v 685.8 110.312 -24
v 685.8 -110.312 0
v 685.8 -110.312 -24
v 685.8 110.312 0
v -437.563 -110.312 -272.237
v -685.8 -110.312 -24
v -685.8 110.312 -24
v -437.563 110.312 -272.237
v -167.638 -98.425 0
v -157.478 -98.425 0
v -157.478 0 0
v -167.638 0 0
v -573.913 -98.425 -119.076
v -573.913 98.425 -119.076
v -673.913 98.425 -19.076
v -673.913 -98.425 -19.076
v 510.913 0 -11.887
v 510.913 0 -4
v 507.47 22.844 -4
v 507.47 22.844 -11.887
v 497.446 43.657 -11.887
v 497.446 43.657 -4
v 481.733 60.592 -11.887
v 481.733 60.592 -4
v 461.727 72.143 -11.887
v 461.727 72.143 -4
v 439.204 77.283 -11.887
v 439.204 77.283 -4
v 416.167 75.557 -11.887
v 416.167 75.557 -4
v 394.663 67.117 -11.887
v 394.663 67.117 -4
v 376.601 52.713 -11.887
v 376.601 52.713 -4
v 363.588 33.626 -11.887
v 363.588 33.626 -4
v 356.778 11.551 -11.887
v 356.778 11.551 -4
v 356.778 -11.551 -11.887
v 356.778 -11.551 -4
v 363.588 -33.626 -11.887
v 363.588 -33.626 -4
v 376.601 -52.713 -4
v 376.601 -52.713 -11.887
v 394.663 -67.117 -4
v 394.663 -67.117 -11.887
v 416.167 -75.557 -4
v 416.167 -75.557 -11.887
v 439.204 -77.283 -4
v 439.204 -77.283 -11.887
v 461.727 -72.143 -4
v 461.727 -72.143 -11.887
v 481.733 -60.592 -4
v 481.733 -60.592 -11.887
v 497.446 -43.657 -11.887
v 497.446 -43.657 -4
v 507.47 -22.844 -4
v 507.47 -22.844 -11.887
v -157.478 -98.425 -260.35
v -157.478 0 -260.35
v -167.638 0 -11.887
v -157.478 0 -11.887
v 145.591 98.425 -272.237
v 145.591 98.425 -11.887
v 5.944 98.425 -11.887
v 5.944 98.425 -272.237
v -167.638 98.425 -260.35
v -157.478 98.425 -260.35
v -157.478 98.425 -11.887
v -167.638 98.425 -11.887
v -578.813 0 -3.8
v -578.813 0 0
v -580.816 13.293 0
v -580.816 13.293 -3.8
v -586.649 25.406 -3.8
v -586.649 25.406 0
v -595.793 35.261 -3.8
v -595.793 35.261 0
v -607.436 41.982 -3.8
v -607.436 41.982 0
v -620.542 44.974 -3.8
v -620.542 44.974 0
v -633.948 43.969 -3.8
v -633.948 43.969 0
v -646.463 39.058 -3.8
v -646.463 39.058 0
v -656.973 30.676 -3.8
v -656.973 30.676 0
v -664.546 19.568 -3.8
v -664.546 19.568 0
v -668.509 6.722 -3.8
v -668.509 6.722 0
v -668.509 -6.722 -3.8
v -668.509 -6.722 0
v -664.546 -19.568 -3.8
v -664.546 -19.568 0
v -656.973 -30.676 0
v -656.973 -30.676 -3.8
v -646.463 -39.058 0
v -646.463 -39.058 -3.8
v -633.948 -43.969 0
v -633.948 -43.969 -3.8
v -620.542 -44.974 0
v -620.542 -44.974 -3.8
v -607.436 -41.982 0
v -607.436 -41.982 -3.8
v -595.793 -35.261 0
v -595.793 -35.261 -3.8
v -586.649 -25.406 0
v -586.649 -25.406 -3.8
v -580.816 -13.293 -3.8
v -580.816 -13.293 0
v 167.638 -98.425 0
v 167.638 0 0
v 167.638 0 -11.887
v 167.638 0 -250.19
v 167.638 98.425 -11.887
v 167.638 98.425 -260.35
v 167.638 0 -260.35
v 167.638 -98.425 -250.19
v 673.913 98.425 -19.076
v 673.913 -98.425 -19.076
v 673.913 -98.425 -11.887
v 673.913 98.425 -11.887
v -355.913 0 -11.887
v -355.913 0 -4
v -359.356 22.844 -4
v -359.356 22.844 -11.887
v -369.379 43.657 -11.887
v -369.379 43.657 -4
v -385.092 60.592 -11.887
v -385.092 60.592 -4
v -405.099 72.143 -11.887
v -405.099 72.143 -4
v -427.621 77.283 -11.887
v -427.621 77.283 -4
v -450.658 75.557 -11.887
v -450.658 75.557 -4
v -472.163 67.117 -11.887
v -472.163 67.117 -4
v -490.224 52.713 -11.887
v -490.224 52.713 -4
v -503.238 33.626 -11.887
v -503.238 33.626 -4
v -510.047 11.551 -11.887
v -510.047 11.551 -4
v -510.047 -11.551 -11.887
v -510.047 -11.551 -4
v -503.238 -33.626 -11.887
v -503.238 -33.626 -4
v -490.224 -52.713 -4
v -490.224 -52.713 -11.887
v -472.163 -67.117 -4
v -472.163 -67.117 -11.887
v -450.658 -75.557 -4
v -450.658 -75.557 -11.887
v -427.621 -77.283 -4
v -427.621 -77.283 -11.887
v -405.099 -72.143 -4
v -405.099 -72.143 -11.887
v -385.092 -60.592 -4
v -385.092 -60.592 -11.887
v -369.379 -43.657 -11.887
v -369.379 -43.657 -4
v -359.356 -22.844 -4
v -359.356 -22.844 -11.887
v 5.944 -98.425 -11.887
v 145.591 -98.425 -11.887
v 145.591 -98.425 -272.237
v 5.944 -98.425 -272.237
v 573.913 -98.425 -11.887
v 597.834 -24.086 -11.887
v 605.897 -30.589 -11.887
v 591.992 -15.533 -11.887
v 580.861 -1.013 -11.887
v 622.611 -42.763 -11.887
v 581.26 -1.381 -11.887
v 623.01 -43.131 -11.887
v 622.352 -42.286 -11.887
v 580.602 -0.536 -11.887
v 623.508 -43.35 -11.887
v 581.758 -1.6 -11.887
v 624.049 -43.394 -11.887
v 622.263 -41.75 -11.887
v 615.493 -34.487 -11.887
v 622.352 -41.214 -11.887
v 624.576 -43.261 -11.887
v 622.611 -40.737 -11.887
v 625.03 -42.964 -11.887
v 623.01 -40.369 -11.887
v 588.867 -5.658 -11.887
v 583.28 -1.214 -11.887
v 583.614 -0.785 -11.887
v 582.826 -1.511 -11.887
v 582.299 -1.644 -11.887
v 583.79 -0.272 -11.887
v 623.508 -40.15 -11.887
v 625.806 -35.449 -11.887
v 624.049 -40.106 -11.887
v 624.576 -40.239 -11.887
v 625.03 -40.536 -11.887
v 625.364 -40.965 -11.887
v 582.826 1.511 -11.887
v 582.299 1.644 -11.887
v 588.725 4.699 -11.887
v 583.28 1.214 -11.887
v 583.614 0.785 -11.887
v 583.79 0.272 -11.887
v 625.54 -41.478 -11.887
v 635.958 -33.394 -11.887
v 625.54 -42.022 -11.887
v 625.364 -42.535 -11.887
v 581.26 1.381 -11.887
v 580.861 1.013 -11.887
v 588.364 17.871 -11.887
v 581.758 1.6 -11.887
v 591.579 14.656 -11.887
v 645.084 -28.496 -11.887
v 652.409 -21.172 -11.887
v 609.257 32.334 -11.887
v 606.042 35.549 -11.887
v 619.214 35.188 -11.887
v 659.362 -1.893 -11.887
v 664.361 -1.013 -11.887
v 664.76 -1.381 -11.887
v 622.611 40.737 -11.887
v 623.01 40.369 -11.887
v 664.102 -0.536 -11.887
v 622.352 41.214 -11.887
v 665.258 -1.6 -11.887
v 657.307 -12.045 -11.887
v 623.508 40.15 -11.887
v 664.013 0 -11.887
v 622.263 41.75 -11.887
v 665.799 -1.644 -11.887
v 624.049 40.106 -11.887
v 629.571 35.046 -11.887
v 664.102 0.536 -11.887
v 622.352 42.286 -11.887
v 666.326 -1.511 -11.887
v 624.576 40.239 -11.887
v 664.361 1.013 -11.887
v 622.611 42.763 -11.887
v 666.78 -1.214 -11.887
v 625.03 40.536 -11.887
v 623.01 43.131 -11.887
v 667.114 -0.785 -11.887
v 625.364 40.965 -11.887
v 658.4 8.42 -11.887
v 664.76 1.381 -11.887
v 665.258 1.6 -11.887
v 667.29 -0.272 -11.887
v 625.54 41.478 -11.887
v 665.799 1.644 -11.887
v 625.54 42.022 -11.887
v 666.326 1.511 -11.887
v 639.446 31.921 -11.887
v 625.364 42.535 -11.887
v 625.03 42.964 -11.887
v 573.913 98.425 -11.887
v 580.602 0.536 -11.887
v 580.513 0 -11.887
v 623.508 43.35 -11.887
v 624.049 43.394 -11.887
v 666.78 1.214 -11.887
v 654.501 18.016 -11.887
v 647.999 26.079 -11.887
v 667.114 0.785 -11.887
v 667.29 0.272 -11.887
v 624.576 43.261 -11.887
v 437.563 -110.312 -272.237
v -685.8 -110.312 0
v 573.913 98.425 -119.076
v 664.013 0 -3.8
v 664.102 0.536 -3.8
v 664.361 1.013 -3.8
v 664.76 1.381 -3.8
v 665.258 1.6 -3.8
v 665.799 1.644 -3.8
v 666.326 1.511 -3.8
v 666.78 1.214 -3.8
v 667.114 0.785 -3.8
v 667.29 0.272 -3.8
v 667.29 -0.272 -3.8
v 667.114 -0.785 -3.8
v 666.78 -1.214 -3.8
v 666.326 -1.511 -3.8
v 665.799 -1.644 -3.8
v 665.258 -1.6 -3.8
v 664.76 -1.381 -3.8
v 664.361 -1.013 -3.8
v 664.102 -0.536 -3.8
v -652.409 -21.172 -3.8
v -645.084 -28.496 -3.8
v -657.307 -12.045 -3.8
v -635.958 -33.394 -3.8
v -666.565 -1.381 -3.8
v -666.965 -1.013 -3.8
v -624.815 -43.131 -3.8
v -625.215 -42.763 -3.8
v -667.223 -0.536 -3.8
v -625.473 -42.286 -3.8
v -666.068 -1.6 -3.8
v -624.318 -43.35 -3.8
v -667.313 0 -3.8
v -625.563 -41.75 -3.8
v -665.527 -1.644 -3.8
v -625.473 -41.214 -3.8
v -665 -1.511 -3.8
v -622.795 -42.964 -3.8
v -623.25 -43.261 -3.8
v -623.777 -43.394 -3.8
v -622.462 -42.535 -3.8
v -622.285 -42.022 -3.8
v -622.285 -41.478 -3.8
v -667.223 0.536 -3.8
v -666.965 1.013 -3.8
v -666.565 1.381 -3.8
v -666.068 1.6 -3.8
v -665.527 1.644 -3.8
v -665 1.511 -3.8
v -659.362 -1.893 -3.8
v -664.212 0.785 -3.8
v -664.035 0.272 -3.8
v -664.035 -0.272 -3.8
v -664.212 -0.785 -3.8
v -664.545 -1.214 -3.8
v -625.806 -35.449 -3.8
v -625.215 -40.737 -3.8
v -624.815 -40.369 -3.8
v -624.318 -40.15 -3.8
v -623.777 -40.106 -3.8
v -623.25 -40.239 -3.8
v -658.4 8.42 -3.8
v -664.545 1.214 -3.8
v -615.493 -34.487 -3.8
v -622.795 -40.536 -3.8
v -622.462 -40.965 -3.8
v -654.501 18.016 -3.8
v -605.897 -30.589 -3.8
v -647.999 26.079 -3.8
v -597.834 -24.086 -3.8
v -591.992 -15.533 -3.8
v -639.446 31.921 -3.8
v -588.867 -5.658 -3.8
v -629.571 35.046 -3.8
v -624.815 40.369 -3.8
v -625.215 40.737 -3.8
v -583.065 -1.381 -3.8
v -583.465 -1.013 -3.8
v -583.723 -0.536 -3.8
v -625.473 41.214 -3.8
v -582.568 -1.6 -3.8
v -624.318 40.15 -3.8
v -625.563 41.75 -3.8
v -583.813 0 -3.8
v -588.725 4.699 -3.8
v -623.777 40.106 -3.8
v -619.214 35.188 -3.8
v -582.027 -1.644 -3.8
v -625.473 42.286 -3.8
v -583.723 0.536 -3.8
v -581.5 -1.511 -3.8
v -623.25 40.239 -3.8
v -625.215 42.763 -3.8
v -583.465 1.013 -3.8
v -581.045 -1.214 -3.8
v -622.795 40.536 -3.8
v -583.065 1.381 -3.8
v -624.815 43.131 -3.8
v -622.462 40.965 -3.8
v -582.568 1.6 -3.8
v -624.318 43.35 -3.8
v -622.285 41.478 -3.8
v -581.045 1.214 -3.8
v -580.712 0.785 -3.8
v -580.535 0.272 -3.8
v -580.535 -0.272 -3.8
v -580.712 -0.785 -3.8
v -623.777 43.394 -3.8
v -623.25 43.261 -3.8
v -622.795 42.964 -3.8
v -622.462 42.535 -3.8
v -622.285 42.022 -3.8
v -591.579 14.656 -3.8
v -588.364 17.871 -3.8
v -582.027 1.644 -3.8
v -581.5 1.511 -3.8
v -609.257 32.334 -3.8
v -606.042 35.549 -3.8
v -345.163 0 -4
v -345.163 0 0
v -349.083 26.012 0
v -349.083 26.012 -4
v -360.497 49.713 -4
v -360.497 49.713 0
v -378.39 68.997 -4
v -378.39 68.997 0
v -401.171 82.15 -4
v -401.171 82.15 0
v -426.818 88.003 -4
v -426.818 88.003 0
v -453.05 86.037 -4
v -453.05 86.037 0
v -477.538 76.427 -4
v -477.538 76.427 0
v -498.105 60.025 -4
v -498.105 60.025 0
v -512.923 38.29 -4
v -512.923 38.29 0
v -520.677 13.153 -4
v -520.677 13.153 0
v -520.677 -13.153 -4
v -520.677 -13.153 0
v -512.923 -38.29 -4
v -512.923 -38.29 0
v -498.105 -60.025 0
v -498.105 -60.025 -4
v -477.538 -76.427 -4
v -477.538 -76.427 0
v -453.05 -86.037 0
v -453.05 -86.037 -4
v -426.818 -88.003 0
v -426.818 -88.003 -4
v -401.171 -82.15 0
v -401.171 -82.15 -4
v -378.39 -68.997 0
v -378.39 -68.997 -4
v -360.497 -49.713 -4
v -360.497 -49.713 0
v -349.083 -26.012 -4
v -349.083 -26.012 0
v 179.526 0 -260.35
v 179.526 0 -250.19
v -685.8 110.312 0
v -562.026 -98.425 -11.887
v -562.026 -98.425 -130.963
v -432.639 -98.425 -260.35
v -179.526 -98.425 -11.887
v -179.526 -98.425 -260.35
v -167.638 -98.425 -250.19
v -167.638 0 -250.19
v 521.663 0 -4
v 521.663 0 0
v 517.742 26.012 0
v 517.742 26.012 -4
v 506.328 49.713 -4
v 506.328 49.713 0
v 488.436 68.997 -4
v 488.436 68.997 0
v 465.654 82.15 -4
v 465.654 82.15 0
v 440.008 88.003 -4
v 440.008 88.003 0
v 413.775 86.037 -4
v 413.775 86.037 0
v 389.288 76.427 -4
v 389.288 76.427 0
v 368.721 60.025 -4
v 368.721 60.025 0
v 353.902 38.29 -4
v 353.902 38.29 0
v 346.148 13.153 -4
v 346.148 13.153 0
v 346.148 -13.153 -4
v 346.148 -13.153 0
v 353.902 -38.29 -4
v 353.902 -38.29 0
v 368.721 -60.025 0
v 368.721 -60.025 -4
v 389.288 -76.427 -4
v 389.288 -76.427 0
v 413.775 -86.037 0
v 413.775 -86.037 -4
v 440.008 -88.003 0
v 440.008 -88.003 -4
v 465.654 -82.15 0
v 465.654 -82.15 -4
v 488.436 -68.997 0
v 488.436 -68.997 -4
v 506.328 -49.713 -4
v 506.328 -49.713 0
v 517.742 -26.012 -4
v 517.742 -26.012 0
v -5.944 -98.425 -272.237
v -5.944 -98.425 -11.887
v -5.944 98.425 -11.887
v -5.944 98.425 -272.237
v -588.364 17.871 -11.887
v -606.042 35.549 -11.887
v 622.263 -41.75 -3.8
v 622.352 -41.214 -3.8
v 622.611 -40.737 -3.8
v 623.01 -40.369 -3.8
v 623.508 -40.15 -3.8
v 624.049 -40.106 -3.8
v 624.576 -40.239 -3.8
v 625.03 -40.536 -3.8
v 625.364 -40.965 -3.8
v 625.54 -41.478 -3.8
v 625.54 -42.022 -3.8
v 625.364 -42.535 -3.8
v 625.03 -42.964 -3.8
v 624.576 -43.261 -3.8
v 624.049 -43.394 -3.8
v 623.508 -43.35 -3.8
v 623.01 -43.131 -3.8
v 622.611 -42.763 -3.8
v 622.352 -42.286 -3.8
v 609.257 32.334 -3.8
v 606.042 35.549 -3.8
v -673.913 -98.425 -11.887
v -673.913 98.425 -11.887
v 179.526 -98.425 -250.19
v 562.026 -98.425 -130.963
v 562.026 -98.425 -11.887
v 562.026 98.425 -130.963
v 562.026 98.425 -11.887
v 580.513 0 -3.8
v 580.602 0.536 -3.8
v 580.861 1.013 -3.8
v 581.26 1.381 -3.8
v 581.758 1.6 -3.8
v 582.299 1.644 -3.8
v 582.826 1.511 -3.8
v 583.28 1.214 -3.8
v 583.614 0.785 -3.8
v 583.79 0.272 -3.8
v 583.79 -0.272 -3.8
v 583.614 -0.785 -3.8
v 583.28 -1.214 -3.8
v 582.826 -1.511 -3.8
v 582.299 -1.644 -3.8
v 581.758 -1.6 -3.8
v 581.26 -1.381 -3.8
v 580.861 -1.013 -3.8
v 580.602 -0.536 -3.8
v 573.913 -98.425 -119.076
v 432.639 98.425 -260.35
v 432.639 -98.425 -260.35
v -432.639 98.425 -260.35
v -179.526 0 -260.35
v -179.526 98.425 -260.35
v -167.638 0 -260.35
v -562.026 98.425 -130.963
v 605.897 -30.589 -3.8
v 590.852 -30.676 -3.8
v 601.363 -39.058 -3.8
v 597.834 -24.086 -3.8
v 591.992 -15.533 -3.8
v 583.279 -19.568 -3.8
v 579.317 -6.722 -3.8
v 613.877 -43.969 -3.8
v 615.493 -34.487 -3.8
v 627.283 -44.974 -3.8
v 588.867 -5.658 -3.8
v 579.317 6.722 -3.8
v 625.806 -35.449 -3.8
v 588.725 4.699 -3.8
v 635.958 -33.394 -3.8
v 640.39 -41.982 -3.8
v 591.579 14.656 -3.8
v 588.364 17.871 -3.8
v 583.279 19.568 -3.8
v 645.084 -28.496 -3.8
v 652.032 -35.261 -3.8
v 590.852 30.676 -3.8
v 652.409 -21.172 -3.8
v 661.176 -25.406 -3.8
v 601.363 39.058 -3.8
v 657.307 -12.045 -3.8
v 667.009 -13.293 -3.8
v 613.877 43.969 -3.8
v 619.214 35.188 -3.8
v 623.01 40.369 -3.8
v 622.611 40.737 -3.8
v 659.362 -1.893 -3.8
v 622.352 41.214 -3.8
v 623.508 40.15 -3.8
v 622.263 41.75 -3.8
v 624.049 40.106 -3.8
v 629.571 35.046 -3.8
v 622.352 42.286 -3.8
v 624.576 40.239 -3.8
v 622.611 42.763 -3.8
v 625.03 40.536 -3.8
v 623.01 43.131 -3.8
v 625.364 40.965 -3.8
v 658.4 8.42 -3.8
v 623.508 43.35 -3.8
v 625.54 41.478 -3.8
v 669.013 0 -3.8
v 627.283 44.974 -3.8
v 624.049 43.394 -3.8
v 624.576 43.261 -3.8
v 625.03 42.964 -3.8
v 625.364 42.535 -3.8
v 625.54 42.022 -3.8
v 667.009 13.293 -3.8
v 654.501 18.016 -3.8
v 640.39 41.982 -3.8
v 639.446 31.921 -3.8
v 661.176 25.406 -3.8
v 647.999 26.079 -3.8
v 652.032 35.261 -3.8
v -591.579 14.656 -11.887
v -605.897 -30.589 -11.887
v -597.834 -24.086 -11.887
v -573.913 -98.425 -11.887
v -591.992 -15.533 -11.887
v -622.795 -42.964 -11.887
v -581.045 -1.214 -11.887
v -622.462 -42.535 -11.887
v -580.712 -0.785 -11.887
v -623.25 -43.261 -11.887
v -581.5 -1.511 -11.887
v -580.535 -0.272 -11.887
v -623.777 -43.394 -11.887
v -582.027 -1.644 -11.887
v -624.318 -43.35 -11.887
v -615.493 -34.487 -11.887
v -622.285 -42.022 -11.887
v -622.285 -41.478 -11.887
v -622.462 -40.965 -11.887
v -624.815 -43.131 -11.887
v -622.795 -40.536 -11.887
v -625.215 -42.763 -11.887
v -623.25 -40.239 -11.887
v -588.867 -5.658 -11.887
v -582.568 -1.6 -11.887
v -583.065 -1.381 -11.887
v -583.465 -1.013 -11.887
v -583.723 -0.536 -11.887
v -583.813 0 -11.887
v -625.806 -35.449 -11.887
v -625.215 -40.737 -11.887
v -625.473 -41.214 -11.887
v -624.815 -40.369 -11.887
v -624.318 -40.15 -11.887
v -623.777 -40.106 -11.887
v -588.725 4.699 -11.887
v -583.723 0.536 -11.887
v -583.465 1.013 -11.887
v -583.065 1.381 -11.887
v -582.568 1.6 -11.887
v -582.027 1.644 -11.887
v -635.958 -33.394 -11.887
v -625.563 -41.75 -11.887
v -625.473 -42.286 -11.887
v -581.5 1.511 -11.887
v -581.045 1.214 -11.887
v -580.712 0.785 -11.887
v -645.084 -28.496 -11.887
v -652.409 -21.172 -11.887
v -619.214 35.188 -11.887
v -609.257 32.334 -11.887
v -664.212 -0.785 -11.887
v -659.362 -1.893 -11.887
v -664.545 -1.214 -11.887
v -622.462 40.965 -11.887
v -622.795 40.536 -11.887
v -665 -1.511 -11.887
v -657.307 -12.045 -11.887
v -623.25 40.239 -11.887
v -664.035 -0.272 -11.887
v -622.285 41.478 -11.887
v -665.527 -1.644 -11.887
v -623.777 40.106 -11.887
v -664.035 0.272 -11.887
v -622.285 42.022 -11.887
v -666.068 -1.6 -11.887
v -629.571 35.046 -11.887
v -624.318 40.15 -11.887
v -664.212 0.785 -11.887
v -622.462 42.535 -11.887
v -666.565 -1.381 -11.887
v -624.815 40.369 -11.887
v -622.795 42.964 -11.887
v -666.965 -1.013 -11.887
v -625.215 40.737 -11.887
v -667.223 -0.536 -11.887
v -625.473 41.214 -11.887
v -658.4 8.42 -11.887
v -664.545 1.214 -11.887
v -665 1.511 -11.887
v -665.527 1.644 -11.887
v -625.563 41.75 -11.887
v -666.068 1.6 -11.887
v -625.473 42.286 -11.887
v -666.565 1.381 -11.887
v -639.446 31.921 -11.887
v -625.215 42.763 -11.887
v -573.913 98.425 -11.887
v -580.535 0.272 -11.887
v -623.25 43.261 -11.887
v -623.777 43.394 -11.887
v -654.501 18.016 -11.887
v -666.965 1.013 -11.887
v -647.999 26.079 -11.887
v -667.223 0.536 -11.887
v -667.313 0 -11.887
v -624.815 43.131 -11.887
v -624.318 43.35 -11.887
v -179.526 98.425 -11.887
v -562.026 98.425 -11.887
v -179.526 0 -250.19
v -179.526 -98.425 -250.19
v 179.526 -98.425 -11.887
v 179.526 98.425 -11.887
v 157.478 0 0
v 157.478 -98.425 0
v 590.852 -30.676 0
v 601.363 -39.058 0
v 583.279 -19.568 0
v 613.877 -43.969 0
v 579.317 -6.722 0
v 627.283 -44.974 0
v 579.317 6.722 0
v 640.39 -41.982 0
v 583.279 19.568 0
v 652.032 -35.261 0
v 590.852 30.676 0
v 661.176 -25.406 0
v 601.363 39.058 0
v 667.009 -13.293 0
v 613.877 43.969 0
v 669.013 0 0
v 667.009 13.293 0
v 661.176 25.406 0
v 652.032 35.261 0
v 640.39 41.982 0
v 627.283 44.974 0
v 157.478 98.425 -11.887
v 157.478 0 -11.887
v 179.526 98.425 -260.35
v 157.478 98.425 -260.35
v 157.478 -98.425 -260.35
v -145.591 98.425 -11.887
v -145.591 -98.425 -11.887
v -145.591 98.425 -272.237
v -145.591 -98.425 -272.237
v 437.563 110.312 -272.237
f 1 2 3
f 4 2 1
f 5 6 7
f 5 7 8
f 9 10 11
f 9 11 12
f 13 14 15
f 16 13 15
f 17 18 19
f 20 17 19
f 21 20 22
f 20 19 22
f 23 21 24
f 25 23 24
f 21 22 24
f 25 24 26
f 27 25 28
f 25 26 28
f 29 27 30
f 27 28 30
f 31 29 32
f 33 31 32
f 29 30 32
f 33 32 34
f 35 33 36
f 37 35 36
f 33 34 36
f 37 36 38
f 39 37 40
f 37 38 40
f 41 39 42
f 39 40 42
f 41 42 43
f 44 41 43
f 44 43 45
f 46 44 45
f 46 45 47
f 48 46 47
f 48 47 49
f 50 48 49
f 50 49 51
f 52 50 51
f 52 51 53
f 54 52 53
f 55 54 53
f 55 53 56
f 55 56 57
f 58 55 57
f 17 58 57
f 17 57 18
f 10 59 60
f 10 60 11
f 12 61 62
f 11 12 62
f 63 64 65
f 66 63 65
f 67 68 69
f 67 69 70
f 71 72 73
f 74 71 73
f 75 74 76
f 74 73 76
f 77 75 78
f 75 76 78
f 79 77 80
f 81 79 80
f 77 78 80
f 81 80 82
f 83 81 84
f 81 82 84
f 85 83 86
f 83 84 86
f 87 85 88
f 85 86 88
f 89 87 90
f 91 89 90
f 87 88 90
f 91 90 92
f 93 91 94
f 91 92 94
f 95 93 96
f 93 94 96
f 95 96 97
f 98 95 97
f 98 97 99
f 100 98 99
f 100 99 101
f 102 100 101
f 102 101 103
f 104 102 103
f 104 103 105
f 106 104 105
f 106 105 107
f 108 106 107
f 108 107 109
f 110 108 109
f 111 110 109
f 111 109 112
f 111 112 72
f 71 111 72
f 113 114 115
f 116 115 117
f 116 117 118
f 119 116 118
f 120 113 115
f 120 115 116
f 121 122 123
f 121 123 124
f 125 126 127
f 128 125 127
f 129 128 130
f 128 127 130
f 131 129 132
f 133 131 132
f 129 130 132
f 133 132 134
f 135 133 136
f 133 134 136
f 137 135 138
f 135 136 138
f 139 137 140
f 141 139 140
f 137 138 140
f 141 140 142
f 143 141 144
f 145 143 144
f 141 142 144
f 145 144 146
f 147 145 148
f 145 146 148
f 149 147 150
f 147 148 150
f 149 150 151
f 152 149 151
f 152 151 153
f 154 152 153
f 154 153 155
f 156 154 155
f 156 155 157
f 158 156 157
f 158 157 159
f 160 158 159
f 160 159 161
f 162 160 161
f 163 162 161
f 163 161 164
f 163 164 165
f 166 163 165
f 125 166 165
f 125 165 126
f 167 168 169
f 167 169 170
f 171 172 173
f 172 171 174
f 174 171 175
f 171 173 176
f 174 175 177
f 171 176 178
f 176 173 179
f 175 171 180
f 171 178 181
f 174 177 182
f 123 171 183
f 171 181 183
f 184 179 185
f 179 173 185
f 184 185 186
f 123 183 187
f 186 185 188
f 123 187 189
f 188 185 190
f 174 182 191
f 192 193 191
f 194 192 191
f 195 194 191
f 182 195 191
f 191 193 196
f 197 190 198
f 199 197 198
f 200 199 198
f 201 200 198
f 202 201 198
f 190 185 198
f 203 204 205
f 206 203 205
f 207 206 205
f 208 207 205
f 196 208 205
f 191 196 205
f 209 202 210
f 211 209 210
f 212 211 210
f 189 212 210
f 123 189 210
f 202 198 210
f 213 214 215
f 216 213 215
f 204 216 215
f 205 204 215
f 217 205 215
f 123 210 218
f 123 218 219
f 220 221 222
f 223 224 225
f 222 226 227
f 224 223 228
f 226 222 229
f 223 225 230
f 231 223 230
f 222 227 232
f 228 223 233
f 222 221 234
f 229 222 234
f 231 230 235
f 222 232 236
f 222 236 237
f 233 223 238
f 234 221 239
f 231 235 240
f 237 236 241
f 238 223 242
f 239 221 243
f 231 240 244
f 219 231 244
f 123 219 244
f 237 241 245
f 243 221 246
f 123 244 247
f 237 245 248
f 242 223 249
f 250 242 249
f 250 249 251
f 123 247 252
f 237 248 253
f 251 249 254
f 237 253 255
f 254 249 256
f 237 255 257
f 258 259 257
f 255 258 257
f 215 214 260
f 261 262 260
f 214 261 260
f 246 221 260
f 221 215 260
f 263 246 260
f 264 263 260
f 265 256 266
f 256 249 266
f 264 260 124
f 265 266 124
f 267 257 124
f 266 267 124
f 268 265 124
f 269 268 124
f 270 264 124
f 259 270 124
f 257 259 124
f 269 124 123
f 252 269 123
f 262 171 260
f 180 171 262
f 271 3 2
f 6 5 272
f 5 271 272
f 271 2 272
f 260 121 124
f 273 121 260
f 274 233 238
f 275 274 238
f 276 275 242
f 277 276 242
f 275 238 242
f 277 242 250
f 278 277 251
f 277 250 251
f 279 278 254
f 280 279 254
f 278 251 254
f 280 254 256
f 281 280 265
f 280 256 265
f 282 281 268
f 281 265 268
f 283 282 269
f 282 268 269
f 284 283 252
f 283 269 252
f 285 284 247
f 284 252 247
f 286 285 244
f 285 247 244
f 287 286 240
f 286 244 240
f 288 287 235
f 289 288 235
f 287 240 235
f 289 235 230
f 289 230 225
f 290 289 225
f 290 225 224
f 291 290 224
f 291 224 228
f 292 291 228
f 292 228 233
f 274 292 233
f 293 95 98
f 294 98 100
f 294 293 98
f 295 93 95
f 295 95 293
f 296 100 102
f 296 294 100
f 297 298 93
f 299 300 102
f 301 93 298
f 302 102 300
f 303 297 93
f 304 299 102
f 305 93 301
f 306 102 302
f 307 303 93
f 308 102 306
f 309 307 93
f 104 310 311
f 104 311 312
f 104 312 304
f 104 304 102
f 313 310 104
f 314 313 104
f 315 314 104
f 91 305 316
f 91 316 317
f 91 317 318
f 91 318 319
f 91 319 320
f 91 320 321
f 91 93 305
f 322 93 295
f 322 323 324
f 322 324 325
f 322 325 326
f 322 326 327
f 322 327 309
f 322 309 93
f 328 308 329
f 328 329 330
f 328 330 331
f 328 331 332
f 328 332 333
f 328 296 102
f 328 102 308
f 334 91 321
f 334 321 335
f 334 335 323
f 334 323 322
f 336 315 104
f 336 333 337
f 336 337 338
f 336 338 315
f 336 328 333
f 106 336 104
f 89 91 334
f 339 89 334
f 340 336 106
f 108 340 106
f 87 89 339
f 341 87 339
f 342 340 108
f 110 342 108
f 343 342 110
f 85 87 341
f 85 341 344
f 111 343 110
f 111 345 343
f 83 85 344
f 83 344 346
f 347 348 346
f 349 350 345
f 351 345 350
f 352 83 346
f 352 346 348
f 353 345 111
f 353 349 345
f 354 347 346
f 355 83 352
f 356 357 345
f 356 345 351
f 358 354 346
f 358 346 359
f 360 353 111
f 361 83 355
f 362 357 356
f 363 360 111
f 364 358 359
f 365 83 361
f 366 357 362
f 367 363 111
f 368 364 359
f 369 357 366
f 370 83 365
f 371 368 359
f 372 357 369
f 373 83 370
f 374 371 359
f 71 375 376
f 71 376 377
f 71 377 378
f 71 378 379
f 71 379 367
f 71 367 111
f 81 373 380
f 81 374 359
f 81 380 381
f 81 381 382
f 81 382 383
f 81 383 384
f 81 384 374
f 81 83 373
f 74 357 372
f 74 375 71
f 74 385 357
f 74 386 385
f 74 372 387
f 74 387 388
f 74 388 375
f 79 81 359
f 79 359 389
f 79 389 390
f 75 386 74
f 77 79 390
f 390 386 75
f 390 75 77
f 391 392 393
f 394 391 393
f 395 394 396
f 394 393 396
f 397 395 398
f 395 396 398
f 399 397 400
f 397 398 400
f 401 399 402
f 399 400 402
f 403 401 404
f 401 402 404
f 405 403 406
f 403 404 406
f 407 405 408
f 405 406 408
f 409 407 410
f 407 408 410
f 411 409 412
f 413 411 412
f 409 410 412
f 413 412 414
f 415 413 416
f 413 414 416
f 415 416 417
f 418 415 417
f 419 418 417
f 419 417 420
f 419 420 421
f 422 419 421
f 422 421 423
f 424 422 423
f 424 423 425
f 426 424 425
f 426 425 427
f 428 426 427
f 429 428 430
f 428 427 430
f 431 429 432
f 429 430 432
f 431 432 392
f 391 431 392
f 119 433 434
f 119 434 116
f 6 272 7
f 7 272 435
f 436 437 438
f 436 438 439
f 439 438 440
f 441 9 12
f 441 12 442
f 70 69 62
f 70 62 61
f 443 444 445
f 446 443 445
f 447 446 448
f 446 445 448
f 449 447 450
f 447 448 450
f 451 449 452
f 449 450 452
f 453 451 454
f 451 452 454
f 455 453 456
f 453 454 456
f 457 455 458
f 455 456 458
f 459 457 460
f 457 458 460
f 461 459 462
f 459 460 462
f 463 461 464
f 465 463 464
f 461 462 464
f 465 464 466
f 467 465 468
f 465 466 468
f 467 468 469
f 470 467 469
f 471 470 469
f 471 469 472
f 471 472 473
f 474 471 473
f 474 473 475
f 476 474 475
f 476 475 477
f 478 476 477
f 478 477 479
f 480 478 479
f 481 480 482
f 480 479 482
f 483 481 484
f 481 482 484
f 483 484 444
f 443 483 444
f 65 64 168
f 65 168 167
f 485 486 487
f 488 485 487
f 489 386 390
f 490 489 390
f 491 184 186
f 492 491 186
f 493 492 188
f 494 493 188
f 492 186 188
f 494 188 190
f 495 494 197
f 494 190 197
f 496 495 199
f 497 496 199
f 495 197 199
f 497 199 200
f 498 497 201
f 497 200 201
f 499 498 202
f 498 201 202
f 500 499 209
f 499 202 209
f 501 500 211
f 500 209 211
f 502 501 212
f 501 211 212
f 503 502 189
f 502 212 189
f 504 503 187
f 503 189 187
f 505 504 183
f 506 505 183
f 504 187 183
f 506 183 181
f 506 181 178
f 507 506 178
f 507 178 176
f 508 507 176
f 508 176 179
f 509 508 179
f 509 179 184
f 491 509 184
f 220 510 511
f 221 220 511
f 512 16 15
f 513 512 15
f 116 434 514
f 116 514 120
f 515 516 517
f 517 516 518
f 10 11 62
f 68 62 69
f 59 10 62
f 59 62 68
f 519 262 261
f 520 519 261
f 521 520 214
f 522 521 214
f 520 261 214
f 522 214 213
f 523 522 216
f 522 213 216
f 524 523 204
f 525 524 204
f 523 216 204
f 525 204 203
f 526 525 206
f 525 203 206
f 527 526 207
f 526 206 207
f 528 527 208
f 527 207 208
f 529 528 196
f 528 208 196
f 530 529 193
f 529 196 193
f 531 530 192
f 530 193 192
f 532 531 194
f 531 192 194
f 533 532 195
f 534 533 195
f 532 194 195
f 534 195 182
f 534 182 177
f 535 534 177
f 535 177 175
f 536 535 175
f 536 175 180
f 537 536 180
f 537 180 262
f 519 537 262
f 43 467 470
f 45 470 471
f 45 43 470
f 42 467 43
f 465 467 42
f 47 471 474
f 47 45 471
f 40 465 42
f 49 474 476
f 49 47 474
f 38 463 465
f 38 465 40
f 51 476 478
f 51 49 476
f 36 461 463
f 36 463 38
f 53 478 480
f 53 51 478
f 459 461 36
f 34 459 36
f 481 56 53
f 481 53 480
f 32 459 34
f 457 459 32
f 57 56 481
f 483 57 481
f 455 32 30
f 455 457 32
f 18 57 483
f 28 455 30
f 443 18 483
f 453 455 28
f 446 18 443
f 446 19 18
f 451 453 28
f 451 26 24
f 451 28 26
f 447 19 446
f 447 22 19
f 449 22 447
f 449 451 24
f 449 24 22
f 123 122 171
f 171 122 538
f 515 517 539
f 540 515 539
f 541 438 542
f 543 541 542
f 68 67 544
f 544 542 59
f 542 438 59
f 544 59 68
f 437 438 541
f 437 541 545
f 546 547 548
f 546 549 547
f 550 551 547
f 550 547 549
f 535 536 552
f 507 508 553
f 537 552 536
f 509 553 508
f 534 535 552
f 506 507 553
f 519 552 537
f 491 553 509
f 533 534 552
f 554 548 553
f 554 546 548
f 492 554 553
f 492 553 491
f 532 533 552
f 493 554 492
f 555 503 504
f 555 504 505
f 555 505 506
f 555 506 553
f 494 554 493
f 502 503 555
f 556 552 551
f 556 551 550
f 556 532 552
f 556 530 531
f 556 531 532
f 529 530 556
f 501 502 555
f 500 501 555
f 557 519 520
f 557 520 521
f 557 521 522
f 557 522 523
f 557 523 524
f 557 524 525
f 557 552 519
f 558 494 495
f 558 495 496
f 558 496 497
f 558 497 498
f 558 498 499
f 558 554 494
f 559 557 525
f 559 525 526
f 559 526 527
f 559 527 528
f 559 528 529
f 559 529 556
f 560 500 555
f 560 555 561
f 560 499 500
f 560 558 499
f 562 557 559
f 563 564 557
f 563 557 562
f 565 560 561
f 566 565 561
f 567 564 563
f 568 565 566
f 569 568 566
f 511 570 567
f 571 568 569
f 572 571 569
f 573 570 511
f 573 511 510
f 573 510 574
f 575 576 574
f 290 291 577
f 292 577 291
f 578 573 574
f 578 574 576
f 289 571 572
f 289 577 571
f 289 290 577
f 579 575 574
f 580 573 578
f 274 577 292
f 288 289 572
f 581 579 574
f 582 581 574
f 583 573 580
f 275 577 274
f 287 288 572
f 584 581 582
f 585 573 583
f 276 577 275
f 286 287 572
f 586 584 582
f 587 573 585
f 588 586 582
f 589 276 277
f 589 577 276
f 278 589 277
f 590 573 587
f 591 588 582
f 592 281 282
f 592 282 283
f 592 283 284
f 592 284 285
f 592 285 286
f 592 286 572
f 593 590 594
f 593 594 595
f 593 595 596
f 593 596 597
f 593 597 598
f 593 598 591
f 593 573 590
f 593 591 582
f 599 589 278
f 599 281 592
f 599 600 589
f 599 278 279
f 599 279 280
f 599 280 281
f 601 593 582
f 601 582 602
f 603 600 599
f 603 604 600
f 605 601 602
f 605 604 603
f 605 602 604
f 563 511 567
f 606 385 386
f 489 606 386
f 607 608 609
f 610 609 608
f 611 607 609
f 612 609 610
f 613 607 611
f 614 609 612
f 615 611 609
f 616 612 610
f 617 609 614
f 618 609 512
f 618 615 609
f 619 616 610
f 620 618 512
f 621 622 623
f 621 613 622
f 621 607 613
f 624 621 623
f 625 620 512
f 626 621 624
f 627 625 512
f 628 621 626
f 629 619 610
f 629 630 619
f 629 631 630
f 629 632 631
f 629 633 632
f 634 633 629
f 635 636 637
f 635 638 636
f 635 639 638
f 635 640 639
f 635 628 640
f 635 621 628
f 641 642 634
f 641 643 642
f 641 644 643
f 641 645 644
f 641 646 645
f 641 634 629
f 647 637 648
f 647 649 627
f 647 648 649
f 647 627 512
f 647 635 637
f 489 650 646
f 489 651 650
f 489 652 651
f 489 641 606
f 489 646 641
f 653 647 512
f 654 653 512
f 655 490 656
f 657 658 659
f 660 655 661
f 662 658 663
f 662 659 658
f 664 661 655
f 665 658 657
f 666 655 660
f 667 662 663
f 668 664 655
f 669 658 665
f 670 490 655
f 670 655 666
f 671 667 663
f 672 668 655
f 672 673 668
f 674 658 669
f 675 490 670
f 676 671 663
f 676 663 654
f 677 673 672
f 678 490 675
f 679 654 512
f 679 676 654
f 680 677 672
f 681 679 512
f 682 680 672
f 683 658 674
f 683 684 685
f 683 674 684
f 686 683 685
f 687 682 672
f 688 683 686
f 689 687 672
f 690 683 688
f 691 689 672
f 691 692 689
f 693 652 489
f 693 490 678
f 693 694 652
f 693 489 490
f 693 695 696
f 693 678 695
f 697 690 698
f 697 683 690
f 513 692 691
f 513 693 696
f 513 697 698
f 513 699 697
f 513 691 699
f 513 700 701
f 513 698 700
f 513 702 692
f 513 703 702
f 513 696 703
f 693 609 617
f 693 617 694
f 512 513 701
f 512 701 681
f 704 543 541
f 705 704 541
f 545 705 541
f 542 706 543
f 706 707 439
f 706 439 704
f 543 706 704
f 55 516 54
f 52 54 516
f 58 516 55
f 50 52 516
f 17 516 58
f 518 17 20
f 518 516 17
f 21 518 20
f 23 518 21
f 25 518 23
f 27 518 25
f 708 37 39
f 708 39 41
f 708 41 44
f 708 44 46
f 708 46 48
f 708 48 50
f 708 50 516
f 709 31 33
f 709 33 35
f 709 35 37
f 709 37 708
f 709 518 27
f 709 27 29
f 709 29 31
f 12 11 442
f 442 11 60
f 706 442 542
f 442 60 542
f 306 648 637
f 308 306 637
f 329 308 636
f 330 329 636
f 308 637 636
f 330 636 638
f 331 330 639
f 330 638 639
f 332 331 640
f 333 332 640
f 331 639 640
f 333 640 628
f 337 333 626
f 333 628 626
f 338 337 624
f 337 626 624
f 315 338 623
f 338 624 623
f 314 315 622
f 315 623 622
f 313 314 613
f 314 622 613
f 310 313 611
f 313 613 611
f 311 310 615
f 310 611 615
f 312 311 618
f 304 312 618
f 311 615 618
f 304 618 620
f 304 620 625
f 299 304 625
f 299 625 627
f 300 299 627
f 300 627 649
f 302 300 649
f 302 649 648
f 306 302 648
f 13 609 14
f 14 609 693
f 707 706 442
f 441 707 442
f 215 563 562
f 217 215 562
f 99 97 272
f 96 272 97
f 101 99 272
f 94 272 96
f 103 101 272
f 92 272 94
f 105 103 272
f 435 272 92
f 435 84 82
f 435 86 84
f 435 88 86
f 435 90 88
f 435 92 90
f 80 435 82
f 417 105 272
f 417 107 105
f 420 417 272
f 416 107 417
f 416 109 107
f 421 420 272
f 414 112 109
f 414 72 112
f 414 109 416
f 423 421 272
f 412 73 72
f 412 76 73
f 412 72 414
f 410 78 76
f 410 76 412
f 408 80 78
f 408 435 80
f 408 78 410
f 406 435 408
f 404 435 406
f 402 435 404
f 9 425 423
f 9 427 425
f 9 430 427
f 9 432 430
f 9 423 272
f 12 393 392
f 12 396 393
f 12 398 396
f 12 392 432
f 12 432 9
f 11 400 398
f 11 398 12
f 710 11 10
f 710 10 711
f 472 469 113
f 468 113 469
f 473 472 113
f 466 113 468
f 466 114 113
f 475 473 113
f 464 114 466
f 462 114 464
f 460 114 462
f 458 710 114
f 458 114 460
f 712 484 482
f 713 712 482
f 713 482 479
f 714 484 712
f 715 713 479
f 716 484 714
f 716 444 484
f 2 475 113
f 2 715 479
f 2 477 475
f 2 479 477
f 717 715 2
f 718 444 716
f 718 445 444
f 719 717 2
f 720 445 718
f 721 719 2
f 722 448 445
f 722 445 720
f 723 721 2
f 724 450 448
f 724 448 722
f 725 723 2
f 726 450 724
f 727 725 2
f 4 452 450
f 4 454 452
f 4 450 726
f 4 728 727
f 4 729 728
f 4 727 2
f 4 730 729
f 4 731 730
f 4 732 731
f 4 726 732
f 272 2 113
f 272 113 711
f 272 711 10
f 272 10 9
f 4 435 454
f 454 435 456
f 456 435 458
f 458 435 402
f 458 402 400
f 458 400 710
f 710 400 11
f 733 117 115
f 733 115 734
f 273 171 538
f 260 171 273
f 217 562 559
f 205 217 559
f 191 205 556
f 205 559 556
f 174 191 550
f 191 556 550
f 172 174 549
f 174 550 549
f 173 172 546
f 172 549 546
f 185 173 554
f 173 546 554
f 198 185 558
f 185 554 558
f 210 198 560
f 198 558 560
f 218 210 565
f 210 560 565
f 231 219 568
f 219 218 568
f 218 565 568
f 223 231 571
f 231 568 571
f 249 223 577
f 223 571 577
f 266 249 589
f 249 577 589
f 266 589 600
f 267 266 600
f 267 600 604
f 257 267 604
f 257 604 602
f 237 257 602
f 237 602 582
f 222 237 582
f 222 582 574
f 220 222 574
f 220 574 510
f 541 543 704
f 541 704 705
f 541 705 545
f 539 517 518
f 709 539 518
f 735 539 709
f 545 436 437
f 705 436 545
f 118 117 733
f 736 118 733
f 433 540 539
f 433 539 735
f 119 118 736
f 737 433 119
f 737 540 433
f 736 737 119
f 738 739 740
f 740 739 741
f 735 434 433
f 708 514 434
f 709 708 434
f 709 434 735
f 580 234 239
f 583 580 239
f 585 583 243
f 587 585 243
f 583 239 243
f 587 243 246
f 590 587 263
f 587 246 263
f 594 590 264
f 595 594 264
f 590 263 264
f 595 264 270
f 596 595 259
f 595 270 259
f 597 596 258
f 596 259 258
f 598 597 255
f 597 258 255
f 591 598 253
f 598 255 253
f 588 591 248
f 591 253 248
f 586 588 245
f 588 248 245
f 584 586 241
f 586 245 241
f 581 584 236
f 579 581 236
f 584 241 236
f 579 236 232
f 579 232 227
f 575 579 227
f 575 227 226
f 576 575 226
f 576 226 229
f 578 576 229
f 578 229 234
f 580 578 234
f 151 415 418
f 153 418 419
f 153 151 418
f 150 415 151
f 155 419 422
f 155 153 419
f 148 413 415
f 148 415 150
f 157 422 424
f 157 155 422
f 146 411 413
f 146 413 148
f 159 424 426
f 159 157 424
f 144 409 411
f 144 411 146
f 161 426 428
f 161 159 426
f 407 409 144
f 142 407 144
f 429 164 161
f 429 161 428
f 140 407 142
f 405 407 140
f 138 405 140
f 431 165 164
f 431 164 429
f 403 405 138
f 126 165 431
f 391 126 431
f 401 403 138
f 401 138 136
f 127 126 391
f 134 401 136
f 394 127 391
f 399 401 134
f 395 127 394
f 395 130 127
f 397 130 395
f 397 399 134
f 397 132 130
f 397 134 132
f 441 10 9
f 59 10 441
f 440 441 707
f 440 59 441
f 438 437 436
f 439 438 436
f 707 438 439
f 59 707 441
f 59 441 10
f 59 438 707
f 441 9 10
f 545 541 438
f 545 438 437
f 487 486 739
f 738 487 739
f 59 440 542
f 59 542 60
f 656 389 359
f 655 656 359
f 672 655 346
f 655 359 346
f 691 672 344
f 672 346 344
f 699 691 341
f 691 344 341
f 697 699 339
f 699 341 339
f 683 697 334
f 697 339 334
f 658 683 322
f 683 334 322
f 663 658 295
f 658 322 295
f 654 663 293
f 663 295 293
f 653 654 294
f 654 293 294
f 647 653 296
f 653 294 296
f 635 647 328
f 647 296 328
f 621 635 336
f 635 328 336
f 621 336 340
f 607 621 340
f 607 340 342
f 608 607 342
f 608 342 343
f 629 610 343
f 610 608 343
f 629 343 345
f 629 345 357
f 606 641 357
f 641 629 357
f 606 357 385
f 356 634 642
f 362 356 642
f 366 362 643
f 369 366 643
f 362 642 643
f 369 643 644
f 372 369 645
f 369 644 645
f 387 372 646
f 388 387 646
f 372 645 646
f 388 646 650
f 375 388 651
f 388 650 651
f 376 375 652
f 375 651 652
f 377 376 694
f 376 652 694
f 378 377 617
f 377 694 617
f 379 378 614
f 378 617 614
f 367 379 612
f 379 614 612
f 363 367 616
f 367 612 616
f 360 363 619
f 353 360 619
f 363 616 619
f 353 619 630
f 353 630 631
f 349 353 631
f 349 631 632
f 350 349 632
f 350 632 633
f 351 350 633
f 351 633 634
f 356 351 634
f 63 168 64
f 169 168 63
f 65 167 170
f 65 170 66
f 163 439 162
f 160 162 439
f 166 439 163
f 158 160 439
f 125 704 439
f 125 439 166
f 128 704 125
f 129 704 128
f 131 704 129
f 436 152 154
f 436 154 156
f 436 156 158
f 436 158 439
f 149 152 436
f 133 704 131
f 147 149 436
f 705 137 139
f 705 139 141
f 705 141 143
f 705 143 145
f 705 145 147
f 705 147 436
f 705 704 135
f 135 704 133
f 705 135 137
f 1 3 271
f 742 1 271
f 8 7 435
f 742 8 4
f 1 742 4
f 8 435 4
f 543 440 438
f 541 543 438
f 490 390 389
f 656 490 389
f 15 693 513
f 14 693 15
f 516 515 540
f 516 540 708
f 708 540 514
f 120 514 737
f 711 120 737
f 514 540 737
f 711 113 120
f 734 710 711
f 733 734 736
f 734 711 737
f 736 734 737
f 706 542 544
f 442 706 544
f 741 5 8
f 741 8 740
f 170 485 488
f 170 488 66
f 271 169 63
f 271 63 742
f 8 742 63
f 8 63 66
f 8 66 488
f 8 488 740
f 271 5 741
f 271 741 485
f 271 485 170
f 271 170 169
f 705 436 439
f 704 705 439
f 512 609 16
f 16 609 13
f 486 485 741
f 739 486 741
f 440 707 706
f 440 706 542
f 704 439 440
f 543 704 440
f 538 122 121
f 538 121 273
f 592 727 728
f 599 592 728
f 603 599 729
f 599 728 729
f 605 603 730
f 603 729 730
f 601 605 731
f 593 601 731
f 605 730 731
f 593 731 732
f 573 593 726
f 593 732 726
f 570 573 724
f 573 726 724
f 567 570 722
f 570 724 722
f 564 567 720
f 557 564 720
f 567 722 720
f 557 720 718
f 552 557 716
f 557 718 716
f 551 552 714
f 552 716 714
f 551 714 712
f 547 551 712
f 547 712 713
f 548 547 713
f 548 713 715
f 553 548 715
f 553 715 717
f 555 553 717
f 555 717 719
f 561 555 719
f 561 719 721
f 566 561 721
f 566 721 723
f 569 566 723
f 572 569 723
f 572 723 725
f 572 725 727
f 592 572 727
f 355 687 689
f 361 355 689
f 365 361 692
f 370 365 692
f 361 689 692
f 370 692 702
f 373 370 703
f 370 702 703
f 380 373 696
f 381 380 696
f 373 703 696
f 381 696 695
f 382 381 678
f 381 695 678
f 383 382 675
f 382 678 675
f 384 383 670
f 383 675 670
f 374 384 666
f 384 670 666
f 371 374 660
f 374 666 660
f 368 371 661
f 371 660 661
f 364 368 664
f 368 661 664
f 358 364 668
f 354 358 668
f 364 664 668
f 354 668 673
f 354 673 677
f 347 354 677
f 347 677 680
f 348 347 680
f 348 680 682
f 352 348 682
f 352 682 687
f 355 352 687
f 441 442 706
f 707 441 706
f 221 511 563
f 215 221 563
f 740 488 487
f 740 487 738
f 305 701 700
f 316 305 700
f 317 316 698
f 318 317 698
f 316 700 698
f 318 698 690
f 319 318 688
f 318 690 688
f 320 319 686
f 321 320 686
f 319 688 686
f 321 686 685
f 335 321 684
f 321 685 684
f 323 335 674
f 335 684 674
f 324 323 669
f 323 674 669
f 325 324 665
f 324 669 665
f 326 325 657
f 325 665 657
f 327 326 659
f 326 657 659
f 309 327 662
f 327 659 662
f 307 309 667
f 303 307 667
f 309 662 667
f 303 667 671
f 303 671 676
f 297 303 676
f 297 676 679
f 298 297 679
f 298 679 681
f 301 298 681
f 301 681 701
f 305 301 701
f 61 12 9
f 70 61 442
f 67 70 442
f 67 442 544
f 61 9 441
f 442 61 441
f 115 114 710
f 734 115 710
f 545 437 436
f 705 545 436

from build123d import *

# Parameters (mm, degrees)
SKETCH1_W                        = 1371.6
SKETCH1_H                        = 220.6244
BOSS_EXTRUDE1_DEPTH              = 272.2372
SKETCH3_W                        = 1347.8256
SKETCH3_H                        = 196.85
CUT_EXTRUDE2_DEPTH               = 260.35
SKETCH4_W                        = 11.8872
SKETCH4_H                        = 196.85
BOSS_EXTRUDE4_DEPTH              = 260.35
CUT_EXTRUDE3_DEPTH               = 771.136259982
CUT_EXTRUDE3_DEPTH_BACK          = 771.136259982
SKETCH5_W                        = 11.8872
SKETCH5_H                        = 196.85
INTERNAL_BRACING_DEPTH           = 260.35
SKETCH2_R                        = 77.5
SKETCH2_R_2                      = 45.1
CUT_EXTRUDE1_DEPTH               = 14
BOSS_EXTRUDE2_START              = -3.8
SKETCH128_R                      = 45.1
SKETCH128_R_2                    = 35.5
BOSS_EXTRUDE2_DEPTH              = 8.0872
CUT_EXTRUDE4_REACH               = 746.68
M4X0_7_TAPPED_HOLE1_D            = 3.3
SKETCH193_R                      = 88.25
CUT_EXTRUDE6_DEPTH               = 4
BOSS_EXTRUDE7_DEPTH              = 220.6244
BOSS_EXTRUDE11_REACH             = 768.815
BOSS_EXTRUDE11_DIRECTION_2_REACH = 768.815
SKETCH198_W                      = 11.8872
SKETCH198_H                      = 10.16002032
SKETCH198_W_2                    = 10.16002032
SKETCH198_H_2                    = 11.8872
CUT_EXTRUDE7_DEPTH               = 98.425
BOSS_EXTRUDE12_DEPTH             = 98.425
BOSS_EXTRUDE13_REACH             = 768.815


with BuildPart() as part:
    # Sketch1 → Boss-Extrude1 (new body)
    with BuildSketch(Plane.XY):
        Rectangle(SKETCH1_W, SKETCH1_H)
    extrude(amount=-BOSS_EXTRUDE1_DEPTH)

    # Sketch3 → Cut-Extrude2 (cut)
    with BuildSketch(Plane(origin=(0, 0, -272.2372), x_dir=(-1, 0, 0), z_dir=(0, 0, -1))):
        Rectangle(SKETCH3_W, SKETCH3_H)
    extrude(amount=-CUT_EXTRUDE2_DEPTH, mode=Mode.SUBTRACT)

    # Sketch4 → Boss-Extrude4 (add)
    with BuildSketch(Plane(origin=(0, 0, -11.8872), x_dir=(-1, 0, 0), z_dir=(0, 0, -1))):
        with Locations((-567.9692, 0)):
            Rectangle(SKETCH4_W, SKETCH4_H)
        with Locations((567.9692, 0)):
            Rectangle(SKETCH4_W, SKETCH4_H)
    extrude(amount=BOSS_EXTRUDE4_DEPTH)

    # Sketch23 → Cut-Extrude3 (cut, two sides: drawn at the far end of the back side and taken through both)
    with BuildSketch(Plane(origin=(0, 110.3122, 0), x_dir=(1, 0, 0), z_dir=(0, 1, 0)).offset(-CUT_EXTRUDE3_DEPTH_BACK)):
        Polygon((-685.8, 24), (-437.5628, 272.2372), (-685.8, 272.2372), align=None)
        Polygon((685.8, 272.2372), (685.8, 24), (437.5628, 272.2372), align=None)
    extrude(amount=CUT_EXTRUDE3_DEPTH + CUT_EXTRUDE3_DEPTH_BACK, mode=Mode.SUBTRACT)

    # Sketch5 → INTERNAL BRACING (add)
    with BuildSketch(Plane(origin=(0, 0, -11.8872), x_dir=(-1, 0, 0), z_dir=(0, 0, -1))):
        with Locations((173.582, 0)):
            Rectangle(SKETCH5_W, SKETCH5_H)
        with Locations((-173.582, 0)):
            Rectangle(SKETCH5_W, SKETCH5_H)
        Rectangle(SKETCH5_W, SKETCH5_H)
    extrude(amount=INTERNAL_BRACING_DEPTH)

    # Sketch2 → Cut-Extrude1 (cut)
    with BuildSketch(Plane.XY):
        with Locations((433.4128, 0)):
            Circle(SKETCH2_R)
        with Locations((623.9128, 0)):
            Circle(SKETCH2_R_2)
        with Locations((-433.4128, 0)):
            Circle(SKETCH2_R)
        with Locations((-623.9128, 0)):
            Circle(SKETCH2_R_2)
    extrude(amount=-CUT_EXTRUDE1_DEPTH, mode=Mode.SUBTRACT)

    # Sketch128 → Boss-Extrude2 (add)
    # profile 1 of 2: a face of its own
    with BuildSketch(Plane.XY.offset(BOSS_EXTRUDE2_START)):
        with Locations((623.9128, 0)):
            Circle(SKETCH128_R)
        with Locations((623.9128, 0)):
            Circle(SKETCH128_R_2, mode=Mode.SUBTRACT)
    # profile 2 of 2: a face of its own
    with BuildSketch(Plane.XY.offset(BOSS_EXTRUDE2_START)):
        with Locations((-623.9128, 0)):
            Circle(SKETCH128_R)
        with Locations((-623.9128, 0)):
            Circle(SKETCH128_R_2, mode=Mode.SUBTRACT)
    extrude(amount=-BOSS_EXTRUDE2_DEPTH)

    # Sketch129 → Cut-Extrude4 (cut, up to next)
    with BuildSketch(Plane.XY.offset(-3.8), mode=Mode.PRIVATE) as cut_extrude4_sk1:
        Polygon((-588.36406402, 17.87106645), (-606.04173355, 35.54873598), (-609.256954516, 32.333515014), (-591.579284986, 14.655845484), align=None)
    cut_extrude4_tool1 = extrude(cut_extrude4_sk1.sketch, amount=-CUT_EXTRUDE4_REACH, mode=Mode.PRIVATE) & part.part
    # Sketch129 → Cut-Extrude4 (cut, up to next)
    with BuildSketch(Plane.XY.offset(-3.8), mode=Mode.PRIVATE) as cut_extrude4_sk2:
        Polygon((591.579284986, 14.655845484), (609.256954516, 32.333515014), (606.04173355, 35.54873598), (588.36406402, 17.87106645), align=None)
    cut_extrude4_tool2 = extrude(cut_extrude4_sk2.sketch, amount=-CUT_EXTRUDE4_REACH, mode=Mode.PRIVATE) & part.part
    add(cut_extrude4_tool1.solids().sort_by_distance((-598.810509, 25.102291, -3.8))[0], mode=Mode.SUBTRACT)
    add(cut_extrude4_tool2.solids().sort_by_distance((598.810509, 25.102291, -3.8))[0], mode=Mode.SUBTRACT)

    # M4x0.7 Tapped Hole1 (through all)
    with Locations(Plane.XY.offset(-3.8)):
        with Locations((665.6628, 0), (-665.6628, 0), (-623.9128, 41.75), (-582.1628, 0), (-623.9128, -41.75), (623.9128, -41.75), (582.1628, 0), (623.9128, 41.75)):
            Hole(M4X0_7_TAPPED_HOLE1_D / 2)

    # Sketch193 → Cut-Extrude6 (cut)
    with BuildSketch(Plane.XY):
        with Locations((-433.4128, 0)):
            Circle(SKETCH193_R)
        with Locations((433.4128, 0)):
            Circle(SKETCH193_R)
    extrude(amount=-CUT_EXTRUDE6_DEPTH, mode=Mode.SUBTRACT)

    # Sketch196 → Boss-Extrude7 (add)
    with BuildSketch(Plane(origin=(0, 110.3122, 0), x_dir=(1, 0, 0), z_dir=(0, 1, 0))):
        Polygon((-432.638960541, 260.35), (-685.8, 7.188960541), (-685.8, 24), (-437.5628, 272.2372), (-167.6384, 272.2372), (-167.6384, 260.35), align=None)
        Polygon((685.8, 7.188960541), (432.638960541, 260.35), (167.6384, 260.35), (167.6384, 272.2372), (437.5628, 272.2372), (685.8, 24), align=None)
    extrude(amount=-BOSS_EXTRUDE7_DEPTH)

    # Sketch197 → Boss-Extrude11 (add, up to next)
    with BuildSketch(Plane(origin=(0, -98.425, 0), x_dir=(1, 0, 0), z_dir=(0, 1, 0)), mode=Mode.PRIVATE) as boss_extrude11_sk1:
        Polygon((-145.59117968, 11.8872), (-145.59117968, 272.2372), (-167.6384, 272.2372), (-167.6384, 260.35), (-157.47837968, 260.35), (-157.47837968, 11.8872), align=None)
    boss_extrude11_tool1 = extrude(boss_extrude11_sk1.sketch, amount=BOSS_EXTRUDE11_REACH, mode=Mode.PRIVATE) - part.part
    boss_extrude11 = boss_extrude11_tool1.solids().sort_by_distance((-151.948813, -98.425, -146.728177))[0]
    add(boss_extrude11)

    # Boss-Extrude11 direction 2: up to this face of the body (flat: up to its plane)
    boss_extrude11_direction_2_end = Plane(part.part.faces().sort_by_distance((0, -110.3122, -125.569689055))[0])
    # Sketch197 → Boss-Extrude11 direction 2 (add, up to the picked face)
    with BuildSketch(Plane(origin=(0, -98.425, 0), x_dir=(1, 0, 0), z_dir=(0, 1, 0)), mode=Mode.PRIVATE) as boss_extrude11_direction_2_sk1:
        Polygon((-145.59117968, 11.8872), (-145.59117968, 272.2372), (-167.6384, 272.2372), (-167.6384, 260.35), (-157.47837968, 260.35), (-157.47837968, 11.8872), align=None)
    boss_extrude11_direction_2_tool1 = split(extrude(boss_extrude11_direction_2_sk1.sketch, amount=-BOSS_EXTRUDE11_DIRECTION_2_REACH, mode=Mode.PRIVATE), bisect_by=boss_extrude11_direction_2_end, keep=Keep.BOTH, mode=Mode.PRIVATE)
    boss_extrude11_direction_2 = boss_extrude11_direction_2_tool1.solids().sort_by(Axis((-151.948813, -98.425, -146.728177), (0, -1, 0)))[0]
    add(boss_extrude11_direction_2)

    # Sketch198 → Cut-Extrude7 (cut)
    with BuildSketch(Plane(origin=(0, -98.425, 0), x_dir=(1, 0, 0), z_dir=(0, 1, 0))):
        with Locations((-173.582, 255.26998984)):
            Rectangle(SKETCH198_W, SKETCH198_H)
        with Locations((-162.55838984, 5.9436)):
            Rectangle(SKETCH198_W_2, SKETCH198_H_2)
    cut_extrude7 = extrude(amount=CUT_EXTRUDE7_DEPTH, mode=Mode.SUBTRACT)

    # Mirror1: Boss-Extrude11, Boss-Extrude11 direction 2, Cut-Extrude7 across plane
    add(boss_extrude11.mirror(Plane(origin=(0, 0, 0), x_dir=(0, 0, 1), z_dir=(1, 0, 0))))
    add(boss_extrude11_direction_2.mirror(Plane(origin=(0, 0, 0), x_dir=(0, 0, 1), z_dir=(1, 0, 0))))
    add(cut_extrude7.mirror(Plane(origin=(0, 0, 0), x_dir=(0, 0, 1), z_dir=(1, 0, 0))), mode=Mode.SUBTRACT)


with BuildPart() as body_2:
    # Sketch199 → Boss-Extrude12 (new body)
    with BuildSketch(Plane(origin=(0, -98.425, 0), x_dir=(1, 0, 0), z_dir=(0, 1, 0))):
        Polygon((-179.5256, 250.18997968), (-179.5256, 260.35), (-157.47837968, 260.35), (-157.47837968, 0), (-167.6384, 0), (-167.6384, 250.18997968), align=None)
    extrude(amount=BOSS_EXTRUDE12_DEPTH)


with BuildPart() as body_3:

    # Sketch200 → Boss-Extrude13 (new, up to next)
    with BuildSketch(Plane(origin=(0, -98.425, 0), x_dir=(1, 0, 0), z_dir=(0, 1, 0)), mode=Mode.PRIVATE) as boss_extrude13_sk1:
        Polygon((-179.5256, 11.8872), (-179.5256, 260.35), (-432.638960541, 260.35), (-562.0256, 130.963360541), (-562.0256, 11.8872), align=None)
    boss_extrude13_tool1 = extrude(boss_extrude13_sk1.sketch, amount=BOSS_EXTRUDE13_REACH, mode=Mode.PRIVATE) - part.part
    add(boss_extrude13_tool1.solids().sort_by_distance((-356.469731, -98.425, -128.285537))[0])


solid = Compound([part.part, body_2.part, body_3.part])
